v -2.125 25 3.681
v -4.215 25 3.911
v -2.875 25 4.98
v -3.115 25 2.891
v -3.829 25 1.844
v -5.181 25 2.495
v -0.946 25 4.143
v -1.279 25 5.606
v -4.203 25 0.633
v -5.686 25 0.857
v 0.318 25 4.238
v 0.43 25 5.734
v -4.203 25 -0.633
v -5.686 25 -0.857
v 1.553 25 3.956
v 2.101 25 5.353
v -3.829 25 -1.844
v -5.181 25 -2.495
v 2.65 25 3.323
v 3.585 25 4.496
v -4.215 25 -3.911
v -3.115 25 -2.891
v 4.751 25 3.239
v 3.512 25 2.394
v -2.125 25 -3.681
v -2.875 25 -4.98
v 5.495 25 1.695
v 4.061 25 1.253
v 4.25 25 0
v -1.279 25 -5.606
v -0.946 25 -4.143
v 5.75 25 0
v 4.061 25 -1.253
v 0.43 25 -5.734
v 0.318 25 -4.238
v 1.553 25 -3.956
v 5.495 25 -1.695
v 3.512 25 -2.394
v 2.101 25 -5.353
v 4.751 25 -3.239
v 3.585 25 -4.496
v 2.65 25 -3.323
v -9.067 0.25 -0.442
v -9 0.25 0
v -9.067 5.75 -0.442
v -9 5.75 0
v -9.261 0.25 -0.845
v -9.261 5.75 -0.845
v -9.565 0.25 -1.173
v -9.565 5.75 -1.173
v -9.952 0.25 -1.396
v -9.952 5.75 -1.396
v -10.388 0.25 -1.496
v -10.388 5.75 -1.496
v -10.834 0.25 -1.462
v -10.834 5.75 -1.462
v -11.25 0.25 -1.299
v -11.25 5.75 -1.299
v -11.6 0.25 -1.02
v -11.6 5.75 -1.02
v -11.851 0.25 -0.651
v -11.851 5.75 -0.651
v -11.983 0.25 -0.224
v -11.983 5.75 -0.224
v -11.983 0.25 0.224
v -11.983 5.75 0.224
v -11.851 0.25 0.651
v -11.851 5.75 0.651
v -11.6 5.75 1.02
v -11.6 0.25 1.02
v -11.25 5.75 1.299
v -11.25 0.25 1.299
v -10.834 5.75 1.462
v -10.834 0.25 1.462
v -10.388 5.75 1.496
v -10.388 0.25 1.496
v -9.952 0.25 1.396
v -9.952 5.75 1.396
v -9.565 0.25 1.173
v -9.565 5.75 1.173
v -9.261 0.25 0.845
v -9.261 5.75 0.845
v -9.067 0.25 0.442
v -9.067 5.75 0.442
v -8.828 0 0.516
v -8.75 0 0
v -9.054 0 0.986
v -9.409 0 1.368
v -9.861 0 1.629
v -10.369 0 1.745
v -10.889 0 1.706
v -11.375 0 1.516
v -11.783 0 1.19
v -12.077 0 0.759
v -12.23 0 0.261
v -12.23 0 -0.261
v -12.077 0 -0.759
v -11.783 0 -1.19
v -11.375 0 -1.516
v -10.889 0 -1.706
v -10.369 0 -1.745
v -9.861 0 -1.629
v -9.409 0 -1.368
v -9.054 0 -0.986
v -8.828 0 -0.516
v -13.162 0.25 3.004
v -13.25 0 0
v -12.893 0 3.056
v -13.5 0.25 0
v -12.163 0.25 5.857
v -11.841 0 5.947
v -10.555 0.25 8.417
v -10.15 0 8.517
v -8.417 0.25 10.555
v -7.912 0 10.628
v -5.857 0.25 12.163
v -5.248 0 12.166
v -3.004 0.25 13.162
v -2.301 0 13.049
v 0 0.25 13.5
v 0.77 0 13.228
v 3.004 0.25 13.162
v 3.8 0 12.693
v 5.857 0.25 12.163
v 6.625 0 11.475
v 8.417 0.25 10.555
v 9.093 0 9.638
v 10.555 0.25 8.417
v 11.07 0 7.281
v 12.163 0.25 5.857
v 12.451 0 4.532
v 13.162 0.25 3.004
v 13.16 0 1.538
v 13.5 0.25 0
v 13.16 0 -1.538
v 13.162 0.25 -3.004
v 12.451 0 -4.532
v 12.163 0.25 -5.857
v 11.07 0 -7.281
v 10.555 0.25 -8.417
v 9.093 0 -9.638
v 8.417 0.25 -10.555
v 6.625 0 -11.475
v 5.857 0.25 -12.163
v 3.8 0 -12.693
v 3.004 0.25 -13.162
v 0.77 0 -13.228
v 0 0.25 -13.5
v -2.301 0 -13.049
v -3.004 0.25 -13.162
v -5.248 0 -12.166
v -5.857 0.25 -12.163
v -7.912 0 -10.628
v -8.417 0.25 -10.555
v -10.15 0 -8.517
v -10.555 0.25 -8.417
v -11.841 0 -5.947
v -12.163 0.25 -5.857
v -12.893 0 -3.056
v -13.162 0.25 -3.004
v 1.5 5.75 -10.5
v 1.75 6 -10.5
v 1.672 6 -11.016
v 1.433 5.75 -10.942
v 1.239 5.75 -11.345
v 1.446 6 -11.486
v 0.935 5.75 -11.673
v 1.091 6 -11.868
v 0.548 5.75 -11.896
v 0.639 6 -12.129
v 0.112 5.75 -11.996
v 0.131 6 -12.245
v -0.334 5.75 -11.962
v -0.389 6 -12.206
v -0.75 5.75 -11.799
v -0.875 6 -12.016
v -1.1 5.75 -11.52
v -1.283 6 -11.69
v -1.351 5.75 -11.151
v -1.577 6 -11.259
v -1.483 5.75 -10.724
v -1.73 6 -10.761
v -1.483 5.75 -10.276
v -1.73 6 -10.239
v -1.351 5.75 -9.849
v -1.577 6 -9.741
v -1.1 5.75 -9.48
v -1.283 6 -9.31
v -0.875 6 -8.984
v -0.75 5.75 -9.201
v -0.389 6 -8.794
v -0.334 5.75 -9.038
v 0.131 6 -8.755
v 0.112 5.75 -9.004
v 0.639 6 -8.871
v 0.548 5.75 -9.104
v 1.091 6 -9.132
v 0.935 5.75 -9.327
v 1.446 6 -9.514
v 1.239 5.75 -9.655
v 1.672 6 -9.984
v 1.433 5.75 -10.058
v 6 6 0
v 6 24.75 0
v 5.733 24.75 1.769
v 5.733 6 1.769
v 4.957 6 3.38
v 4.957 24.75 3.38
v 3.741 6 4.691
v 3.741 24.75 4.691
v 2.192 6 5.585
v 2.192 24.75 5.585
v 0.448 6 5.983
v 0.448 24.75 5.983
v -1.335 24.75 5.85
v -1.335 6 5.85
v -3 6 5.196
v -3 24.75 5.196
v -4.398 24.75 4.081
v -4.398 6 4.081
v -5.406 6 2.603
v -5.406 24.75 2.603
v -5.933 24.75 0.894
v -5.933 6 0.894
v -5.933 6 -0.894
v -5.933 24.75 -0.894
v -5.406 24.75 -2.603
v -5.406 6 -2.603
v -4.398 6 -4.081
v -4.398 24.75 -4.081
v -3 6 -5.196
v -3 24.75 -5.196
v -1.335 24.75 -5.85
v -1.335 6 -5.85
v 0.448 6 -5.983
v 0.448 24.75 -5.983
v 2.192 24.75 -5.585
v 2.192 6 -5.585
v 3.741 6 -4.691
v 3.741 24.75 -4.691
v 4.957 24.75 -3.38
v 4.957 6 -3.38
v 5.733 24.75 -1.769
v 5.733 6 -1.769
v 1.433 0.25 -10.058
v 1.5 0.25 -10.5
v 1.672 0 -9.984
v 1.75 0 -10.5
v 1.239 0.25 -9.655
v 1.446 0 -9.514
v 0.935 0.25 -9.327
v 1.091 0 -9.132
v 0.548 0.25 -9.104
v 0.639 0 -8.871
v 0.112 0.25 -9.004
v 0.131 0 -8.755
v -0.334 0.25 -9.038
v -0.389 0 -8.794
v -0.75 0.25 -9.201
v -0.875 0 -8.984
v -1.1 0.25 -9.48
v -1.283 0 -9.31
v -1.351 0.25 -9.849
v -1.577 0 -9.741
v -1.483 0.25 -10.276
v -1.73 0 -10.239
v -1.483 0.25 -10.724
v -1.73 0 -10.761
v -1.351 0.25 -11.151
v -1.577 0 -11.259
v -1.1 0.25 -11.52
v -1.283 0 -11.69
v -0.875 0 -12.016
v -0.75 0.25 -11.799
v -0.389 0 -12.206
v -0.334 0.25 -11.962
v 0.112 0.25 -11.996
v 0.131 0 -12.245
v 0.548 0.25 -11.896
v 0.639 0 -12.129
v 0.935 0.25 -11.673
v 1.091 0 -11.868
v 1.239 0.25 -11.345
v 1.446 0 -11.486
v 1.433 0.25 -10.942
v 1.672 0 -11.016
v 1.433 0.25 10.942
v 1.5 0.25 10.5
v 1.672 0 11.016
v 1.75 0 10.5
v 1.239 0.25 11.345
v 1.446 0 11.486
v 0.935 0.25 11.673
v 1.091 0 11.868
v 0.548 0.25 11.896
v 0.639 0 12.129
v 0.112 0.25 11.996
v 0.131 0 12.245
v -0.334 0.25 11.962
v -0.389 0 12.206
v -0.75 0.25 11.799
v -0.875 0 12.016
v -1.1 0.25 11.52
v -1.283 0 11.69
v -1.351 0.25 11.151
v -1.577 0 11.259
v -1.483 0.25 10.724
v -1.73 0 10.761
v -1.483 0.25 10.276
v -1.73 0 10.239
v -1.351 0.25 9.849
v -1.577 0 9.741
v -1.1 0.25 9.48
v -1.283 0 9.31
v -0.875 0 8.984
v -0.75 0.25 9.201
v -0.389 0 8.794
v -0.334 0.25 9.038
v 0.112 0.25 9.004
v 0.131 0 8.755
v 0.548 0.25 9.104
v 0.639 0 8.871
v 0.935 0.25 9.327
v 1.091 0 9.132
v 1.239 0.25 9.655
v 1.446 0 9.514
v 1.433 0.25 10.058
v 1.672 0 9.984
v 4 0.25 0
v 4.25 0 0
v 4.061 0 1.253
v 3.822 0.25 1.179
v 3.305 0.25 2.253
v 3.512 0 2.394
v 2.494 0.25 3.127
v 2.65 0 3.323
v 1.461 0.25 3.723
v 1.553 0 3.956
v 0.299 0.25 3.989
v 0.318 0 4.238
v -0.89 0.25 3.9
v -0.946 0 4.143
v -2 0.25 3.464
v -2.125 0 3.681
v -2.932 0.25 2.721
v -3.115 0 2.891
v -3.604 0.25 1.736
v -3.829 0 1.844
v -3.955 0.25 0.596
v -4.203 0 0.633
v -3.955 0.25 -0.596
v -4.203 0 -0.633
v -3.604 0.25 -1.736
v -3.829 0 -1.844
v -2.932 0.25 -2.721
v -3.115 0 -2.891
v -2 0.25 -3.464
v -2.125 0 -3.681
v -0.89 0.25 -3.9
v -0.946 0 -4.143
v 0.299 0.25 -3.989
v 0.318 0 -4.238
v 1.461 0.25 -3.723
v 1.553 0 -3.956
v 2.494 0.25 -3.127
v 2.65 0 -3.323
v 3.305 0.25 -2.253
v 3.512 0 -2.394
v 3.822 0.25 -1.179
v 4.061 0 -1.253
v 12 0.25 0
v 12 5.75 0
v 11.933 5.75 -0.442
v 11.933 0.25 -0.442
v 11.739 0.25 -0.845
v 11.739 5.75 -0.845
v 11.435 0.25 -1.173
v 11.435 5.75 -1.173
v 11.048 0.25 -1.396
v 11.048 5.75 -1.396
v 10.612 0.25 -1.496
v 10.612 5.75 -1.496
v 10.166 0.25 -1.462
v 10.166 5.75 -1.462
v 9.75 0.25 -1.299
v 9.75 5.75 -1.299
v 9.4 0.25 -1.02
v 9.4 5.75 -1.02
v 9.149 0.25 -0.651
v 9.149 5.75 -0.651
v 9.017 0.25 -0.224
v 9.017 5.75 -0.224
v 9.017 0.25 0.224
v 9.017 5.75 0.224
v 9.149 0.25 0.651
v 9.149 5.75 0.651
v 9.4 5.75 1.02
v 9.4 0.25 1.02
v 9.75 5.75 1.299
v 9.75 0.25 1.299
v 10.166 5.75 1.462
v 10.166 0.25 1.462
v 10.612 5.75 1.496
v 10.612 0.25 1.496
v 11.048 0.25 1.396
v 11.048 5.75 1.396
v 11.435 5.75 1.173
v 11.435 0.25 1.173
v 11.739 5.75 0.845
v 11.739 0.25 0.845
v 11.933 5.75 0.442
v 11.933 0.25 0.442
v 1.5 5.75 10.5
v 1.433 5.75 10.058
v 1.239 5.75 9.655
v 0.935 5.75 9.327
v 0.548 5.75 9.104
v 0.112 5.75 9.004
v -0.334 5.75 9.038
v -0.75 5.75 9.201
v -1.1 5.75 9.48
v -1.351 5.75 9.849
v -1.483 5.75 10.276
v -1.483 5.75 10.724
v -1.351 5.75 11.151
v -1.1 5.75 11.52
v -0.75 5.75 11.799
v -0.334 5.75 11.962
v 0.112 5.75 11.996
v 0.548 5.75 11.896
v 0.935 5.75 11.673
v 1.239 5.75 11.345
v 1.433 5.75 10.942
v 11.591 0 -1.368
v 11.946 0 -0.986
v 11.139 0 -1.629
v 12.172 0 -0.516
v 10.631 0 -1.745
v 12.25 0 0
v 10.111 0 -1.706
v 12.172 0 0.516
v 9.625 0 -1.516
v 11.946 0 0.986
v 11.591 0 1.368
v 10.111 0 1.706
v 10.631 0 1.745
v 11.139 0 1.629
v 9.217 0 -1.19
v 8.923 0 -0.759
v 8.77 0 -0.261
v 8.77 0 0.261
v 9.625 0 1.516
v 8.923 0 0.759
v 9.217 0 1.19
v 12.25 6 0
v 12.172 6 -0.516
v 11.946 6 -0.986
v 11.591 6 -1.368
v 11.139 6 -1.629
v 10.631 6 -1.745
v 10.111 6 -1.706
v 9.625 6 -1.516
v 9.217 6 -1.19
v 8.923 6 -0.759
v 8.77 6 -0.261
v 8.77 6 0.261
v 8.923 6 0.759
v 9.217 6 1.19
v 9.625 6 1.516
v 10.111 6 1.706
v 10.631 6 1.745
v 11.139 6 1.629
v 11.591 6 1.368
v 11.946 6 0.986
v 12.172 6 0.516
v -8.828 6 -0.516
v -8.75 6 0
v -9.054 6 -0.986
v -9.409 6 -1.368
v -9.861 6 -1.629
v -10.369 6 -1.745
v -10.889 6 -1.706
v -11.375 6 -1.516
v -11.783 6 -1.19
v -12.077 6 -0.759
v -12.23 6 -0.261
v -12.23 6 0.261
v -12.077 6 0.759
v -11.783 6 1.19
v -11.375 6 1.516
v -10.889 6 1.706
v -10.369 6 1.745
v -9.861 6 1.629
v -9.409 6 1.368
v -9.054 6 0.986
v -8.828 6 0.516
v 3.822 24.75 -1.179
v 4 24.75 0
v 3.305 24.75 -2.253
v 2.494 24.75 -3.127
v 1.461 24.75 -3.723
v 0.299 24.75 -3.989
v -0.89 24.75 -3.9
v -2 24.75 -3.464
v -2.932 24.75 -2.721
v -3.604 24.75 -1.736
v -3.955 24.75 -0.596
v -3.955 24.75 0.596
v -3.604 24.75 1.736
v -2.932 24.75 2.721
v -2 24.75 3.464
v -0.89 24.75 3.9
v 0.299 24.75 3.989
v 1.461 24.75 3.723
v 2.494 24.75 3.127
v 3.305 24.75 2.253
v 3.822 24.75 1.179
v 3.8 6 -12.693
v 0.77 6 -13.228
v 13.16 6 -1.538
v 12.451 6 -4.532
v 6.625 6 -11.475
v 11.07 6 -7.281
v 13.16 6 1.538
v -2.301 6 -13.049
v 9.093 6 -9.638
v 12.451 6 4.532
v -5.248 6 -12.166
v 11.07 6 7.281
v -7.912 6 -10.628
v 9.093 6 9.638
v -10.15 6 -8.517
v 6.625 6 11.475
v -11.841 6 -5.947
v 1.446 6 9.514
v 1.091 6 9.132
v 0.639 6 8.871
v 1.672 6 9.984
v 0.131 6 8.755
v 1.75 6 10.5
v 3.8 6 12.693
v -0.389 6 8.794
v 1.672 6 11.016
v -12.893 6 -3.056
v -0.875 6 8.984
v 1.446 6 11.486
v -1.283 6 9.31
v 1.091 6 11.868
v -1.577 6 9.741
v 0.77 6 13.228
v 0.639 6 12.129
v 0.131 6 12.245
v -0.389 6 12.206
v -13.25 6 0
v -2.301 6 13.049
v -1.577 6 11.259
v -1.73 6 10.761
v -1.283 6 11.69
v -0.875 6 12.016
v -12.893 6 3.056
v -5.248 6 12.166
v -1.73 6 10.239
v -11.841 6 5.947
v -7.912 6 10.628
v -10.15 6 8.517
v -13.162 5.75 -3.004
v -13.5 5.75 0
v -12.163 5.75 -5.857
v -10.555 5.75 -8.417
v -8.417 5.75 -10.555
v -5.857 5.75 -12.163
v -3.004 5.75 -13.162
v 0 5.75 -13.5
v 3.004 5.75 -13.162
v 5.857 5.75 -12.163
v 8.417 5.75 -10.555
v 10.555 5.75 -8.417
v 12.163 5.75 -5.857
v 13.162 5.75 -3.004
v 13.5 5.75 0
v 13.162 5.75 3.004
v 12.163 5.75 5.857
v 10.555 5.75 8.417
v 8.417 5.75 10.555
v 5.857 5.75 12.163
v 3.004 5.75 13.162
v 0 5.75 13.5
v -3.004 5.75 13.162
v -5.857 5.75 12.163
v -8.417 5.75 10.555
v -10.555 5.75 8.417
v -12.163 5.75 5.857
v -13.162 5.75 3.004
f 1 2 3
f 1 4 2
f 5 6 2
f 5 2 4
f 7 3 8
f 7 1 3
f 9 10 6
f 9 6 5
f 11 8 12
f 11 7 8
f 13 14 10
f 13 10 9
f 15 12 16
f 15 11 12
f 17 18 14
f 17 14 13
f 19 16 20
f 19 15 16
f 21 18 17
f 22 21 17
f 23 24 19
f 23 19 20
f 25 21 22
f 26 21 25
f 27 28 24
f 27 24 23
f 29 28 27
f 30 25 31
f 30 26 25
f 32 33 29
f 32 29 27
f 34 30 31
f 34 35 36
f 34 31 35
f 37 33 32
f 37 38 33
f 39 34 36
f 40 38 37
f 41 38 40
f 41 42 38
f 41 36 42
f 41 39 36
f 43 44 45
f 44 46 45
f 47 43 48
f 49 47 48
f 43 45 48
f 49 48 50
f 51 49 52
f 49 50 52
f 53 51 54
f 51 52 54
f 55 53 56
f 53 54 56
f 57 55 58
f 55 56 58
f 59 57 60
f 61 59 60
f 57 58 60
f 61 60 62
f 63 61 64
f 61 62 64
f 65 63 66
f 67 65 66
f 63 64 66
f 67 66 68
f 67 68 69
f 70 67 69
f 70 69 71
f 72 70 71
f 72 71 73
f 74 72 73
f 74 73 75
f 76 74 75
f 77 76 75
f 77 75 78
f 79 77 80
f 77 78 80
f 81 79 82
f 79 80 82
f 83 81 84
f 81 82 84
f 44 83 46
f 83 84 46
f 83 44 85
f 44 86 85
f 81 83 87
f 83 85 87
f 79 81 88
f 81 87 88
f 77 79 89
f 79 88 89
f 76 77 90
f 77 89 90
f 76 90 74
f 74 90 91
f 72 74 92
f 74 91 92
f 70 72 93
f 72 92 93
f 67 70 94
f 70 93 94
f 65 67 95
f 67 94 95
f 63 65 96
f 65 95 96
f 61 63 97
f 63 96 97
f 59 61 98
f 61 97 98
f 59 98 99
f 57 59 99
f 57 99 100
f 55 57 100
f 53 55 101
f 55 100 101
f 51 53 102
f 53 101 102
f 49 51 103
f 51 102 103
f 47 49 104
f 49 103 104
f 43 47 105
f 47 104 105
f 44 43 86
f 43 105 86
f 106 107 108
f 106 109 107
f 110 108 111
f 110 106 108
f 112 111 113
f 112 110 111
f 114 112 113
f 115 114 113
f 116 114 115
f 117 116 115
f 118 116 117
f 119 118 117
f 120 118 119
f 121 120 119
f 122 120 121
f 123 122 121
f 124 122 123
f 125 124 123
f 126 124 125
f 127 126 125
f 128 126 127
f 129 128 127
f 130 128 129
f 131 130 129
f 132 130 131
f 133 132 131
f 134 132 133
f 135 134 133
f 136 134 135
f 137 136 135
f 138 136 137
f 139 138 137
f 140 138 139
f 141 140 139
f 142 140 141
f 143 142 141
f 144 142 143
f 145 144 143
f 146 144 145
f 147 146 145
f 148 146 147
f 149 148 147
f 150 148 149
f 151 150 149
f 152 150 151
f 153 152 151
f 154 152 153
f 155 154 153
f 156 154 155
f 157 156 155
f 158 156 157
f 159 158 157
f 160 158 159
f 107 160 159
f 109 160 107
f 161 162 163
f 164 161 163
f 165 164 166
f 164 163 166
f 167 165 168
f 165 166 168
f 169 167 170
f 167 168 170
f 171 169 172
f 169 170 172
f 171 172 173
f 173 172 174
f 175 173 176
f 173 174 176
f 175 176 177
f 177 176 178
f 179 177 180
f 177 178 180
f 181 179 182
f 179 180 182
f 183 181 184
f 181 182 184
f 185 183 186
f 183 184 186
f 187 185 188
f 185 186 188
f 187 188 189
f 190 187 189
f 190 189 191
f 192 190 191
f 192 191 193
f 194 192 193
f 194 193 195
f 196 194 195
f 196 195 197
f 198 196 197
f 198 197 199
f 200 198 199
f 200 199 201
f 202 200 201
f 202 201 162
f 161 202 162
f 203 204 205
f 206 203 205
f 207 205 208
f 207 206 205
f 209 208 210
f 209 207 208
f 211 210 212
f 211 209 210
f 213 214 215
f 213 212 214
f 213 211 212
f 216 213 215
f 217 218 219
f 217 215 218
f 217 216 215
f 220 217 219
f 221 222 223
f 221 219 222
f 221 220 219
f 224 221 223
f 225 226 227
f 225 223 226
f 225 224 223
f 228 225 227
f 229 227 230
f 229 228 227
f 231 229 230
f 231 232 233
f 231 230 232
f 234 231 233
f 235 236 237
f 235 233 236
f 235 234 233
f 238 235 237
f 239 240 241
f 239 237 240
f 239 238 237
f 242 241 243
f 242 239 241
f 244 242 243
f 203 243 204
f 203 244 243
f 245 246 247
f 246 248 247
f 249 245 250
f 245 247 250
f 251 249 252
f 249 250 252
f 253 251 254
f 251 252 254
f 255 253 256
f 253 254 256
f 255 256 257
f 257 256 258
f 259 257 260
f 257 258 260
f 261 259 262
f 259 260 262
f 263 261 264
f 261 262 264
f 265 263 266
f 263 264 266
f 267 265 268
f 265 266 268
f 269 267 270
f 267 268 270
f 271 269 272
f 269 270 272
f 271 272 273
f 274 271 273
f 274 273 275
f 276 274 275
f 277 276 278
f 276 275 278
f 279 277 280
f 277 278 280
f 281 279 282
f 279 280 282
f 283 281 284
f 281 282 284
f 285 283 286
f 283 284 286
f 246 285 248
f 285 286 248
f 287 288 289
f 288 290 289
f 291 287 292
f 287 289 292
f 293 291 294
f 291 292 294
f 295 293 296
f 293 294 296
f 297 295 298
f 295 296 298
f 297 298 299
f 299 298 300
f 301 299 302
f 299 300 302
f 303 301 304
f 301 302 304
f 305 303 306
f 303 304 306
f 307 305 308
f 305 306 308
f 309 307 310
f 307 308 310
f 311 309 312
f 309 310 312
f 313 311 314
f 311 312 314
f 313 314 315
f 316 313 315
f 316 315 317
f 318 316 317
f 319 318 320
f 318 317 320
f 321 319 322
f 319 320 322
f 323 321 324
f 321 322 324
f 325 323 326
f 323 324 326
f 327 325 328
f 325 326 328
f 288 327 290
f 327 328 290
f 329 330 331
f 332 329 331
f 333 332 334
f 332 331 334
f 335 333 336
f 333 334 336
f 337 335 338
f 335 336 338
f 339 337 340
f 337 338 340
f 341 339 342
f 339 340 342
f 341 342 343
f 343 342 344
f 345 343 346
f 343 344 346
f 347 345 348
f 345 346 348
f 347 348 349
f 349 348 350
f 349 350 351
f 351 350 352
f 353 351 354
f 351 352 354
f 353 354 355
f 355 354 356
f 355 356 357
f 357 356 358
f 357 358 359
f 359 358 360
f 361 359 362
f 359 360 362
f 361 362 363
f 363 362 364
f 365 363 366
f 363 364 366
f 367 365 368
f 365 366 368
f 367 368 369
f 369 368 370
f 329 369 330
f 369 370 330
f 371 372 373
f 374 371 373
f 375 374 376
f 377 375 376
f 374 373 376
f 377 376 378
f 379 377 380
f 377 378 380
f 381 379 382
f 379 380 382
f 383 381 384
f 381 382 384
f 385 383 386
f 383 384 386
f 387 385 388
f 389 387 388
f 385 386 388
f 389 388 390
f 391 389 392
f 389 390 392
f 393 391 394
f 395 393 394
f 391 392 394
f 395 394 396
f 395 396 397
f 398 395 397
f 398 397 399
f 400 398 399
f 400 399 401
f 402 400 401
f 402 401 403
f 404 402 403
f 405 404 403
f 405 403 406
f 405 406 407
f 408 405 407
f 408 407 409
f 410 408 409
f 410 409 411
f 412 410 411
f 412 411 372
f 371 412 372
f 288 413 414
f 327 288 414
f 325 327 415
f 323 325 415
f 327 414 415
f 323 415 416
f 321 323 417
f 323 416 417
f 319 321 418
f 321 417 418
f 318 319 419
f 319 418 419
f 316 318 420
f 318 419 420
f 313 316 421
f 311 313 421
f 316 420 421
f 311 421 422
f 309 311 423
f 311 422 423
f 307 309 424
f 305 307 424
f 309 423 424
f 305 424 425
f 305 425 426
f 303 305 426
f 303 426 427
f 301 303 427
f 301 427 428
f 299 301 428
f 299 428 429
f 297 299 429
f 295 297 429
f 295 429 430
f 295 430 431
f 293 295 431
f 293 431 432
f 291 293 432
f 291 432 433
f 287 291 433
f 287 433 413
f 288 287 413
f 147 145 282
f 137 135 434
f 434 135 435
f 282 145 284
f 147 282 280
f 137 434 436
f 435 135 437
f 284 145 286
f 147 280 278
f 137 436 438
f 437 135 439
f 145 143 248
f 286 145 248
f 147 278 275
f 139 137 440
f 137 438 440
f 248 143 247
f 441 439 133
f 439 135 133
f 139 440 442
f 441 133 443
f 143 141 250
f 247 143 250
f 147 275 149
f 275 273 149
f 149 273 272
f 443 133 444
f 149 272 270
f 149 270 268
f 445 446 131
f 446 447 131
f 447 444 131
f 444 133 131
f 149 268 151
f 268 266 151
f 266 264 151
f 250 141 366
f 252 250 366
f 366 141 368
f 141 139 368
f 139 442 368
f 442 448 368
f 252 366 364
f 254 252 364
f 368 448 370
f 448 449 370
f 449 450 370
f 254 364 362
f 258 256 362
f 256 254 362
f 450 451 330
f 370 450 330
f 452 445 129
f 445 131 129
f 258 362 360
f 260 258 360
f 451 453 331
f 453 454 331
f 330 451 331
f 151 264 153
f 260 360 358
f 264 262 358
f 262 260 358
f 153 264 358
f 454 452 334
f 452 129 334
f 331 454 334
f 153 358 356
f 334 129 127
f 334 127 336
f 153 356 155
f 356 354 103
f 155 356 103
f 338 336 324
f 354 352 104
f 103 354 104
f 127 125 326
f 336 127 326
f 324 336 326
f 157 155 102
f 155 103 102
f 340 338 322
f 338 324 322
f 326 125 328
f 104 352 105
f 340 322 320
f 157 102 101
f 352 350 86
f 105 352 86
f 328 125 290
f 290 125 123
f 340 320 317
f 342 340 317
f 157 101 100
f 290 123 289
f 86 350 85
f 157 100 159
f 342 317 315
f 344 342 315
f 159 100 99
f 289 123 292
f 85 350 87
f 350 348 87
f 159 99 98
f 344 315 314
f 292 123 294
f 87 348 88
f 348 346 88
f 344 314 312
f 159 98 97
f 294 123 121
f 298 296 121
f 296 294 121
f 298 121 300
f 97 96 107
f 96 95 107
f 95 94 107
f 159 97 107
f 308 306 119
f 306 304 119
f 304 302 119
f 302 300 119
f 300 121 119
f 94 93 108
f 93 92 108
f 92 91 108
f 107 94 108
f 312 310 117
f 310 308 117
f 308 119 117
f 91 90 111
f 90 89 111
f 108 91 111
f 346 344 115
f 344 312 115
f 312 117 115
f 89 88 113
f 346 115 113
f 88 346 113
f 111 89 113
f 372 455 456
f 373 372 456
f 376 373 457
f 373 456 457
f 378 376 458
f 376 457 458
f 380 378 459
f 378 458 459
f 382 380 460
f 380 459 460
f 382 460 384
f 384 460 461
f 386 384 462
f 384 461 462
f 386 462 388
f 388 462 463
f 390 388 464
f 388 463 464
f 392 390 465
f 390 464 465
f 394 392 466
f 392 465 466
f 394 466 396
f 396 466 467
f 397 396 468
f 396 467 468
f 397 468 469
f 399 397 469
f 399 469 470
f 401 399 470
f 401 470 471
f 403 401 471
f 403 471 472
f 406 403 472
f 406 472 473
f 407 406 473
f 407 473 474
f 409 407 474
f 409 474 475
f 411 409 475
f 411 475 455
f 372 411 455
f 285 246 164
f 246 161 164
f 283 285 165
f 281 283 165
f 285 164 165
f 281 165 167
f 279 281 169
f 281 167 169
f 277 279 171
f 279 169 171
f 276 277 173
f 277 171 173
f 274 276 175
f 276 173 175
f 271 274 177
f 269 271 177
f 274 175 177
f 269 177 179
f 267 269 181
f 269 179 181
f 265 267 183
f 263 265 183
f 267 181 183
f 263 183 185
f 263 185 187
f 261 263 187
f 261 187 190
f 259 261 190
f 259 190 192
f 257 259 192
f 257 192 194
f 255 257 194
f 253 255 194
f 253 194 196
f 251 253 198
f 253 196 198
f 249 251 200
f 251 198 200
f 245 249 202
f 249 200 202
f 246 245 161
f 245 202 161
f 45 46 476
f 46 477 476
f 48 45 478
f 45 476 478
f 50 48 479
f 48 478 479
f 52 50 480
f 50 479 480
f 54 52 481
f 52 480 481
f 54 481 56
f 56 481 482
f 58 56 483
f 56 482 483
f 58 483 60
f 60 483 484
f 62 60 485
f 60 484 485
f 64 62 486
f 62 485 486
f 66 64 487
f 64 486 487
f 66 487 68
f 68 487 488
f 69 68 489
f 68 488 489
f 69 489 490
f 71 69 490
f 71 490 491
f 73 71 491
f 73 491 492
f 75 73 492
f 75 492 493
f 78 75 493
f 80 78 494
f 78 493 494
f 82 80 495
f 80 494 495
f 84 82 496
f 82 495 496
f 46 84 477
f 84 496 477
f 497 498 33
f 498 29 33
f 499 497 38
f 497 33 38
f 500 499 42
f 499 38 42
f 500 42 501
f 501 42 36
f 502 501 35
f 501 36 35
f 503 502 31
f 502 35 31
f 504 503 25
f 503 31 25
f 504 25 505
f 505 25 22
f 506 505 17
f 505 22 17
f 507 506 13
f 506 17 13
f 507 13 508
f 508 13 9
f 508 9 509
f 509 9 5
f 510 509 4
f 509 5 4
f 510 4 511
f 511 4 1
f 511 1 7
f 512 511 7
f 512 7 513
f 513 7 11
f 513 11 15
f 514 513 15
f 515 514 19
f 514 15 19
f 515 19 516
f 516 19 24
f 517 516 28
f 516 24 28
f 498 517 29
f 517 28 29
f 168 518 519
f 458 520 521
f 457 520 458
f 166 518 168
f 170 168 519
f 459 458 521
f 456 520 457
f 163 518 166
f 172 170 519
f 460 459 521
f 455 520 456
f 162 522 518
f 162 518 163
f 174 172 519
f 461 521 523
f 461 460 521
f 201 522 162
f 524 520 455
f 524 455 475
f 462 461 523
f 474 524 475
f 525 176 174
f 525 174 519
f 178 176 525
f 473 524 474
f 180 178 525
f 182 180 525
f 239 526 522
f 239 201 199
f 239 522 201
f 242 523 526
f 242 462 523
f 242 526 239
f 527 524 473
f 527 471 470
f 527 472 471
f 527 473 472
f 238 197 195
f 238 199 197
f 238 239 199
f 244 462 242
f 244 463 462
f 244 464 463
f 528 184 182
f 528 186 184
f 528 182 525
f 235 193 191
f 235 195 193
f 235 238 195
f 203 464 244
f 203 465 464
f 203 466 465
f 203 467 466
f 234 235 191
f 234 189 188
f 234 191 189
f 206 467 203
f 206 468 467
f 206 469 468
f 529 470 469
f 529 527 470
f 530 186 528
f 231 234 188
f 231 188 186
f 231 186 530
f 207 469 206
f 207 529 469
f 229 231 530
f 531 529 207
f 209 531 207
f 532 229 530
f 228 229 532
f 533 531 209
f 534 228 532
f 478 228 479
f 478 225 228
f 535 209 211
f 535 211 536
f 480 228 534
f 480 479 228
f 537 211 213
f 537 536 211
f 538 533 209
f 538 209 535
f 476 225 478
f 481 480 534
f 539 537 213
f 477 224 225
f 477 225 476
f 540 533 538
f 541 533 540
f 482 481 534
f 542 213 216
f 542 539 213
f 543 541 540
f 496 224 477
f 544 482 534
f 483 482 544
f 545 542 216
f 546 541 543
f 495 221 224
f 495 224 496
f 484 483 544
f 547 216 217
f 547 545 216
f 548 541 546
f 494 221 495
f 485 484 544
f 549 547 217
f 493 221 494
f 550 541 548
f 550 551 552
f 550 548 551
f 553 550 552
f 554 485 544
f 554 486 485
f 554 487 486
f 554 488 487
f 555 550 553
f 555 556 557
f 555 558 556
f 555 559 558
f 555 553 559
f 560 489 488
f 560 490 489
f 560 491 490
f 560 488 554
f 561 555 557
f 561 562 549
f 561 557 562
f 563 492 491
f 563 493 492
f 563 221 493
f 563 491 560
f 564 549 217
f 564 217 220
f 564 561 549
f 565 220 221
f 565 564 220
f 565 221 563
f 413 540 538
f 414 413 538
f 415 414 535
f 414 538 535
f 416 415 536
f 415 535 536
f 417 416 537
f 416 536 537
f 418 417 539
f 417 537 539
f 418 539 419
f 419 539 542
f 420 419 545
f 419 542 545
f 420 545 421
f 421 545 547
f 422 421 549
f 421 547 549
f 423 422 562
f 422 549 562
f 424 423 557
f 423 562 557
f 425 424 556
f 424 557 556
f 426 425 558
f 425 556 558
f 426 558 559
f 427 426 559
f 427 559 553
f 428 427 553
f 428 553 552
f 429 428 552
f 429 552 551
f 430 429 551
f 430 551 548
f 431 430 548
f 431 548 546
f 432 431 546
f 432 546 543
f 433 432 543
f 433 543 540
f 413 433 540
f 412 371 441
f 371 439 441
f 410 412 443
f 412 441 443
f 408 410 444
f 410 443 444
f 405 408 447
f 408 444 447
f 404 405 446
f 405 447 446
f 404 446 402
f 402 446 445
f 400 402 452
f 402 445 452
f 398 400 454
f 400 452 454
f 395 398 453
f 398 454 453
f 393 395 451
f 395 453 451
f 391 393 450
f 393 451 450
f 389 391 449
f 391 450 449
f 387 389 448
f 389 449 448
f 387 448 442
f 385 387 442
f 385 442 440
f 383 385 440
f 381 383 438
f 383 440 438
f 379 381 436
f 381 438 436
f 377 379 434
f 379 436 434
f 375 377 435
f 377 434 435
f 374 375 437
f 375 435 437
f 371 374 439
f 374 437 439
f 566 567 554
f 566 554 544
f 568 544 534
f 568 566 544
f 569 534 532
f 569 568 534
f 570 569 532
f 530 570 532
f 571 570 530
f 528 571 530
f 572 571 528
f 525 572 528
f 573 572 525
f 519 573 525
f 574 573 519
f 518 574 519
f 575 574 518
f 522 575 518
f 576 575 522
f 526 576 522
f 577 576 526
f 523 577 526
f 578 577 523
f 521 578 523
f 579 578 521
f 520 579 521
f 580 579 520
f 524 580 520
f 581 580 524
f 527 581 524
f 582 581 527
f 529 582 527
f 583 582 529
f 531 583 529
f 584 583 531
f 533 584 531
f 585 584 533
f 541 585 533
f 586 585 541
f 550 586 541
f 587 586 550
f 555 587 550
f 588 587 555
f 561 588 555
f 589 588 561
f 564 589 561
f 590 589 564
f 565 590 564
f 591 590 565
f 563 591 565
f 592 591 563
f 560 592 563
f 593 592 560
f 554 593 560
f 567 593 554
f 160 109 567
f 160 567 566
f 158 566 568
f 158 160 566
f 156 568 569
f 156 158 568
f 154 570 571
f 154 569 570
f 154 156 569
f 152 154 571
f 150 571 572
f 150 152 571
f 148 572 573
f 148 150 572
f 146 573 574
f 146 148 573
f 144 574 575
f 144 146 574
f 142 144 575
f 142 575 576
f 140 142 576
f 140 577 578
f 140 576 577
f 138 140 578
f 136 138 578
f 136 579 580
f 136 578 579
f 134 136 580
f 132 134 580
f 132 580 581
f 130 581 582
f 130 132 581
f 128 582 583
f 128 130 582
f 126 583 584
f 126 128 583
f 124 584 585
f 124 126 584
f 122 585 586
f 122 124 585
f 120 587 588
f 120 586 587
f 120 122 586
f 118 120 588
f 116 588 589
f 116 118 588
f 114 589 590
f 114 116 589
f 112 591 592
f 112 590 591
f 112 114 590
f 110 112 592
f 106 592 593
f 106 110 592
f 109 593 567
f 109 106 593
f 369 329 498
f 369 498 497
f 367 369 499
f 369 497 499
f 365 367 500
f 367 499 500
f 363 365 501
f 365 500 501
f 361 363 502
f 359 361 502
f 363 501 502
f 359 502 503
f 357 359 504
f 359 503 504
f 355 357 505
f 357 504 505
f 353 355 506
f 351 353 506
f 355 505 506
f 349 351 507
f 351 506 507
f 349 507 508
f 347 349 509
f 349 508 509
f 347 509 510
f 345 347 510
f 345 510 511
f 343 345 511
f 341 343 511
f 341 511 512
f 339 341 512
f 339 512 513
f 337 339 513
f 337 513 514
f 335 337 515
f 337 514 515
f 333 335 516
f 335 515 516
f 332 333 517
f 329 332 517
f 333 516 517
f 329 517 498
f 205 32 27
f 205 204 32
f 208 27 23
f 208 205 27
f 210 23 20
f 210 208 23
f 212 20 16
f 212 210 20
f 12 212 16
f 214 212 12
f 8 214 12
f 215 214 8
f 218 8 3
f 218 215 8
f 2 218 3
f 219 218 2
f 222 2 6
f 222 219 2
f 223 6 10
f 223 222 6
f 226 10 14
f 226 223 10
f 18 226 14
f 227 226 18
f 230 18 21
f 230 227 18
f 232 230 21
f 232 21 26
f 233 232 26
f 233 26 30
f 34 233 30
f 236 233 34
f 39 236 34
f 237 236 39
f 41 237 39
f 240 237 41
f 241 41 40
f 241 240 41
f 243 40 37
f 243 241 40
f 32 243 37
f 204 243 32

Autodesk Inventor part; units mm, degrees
ref_plane "YZ Plane" through (0, 0, 0) normal (1, 0, 0) x (0, 1, 0)
ref_plane "XZ Plane" through (0, 0, 0) normal (0, 1, 0) x (-1, 0, 0)
ref_plane "XY Plane" through (0, 0, 0) normal (0, 0, 1) x (1, 0, 0)
sketch "Эскиз1" plane through (0, 0, 0) normal (0, 1, 0) x (-1, 0, 0)
  circle A0 centre (0, 0) radius 13.5
  dimension "d0" = 27
extrude "Выдавливание1" add sketch "Эскиз1" along normal blind 6
sketch "Эскиз2" plane through (0, 6, 0) normal (0, 1, 0) x (1, 0, 0)
  circle A0 centre (0, 0) radius 6
  dimension "d3" = 12
extrude "Выдавливание2" add sketch "Эскиз2" along normal blind 19
sketch "Эскиз3" plane through (0, 25, 0) normal (0, 1, 0) x (1, 0, 0)
  circle A0 centre (0, 0) radius 4
  dimension "d6" = 8
extrude "Выдавливание3" cut sketch "Эскиз3" against normal through all
chamfer "Фаска1" distance 0.25 angle 45 5 edges at (-4, 25, 0) (-6, 25, 0) (13.5, 6, 0) (13.5, 0, 0) (-4, 0, 0)
sketch "Эскиз4" plane through (0, 6, 0) normal (0, 1, 0) x (1, 0, 0)
  circle A0 centre (0, -10.5) radius 1.5
  circle A1 centre (-10.5, 0) radius 1.5
  circle A2 centre (0, 10.5) radius 1.5
  circle A3 centre (10.5, 0) radius 1.5
  dimension "d13" = 3
  dimension "d14" = 3
  dimension "d15" = 3
  dimension "d16" = 3
extrude "Выдавливание4" cut sketch "Эскиз4" against normal through all
chamfer "Фаска2" distance 0.25 angle 45 8 edges at (-12, 6, 0) (-1.5, 6, -10.5) (9, 6, 0) (-1.5, 6, 10.5) (-1.5, 0, 10.5) (-12, 0, 0) (9, 0, 0) (-1.5, 0, -10.5)
thread "Резьба1" size "M8x1.25" class "6H" standard "ANSI Metric M Profile" full length
properties part number "Tin-bronze M8 nut for Z- axis"
